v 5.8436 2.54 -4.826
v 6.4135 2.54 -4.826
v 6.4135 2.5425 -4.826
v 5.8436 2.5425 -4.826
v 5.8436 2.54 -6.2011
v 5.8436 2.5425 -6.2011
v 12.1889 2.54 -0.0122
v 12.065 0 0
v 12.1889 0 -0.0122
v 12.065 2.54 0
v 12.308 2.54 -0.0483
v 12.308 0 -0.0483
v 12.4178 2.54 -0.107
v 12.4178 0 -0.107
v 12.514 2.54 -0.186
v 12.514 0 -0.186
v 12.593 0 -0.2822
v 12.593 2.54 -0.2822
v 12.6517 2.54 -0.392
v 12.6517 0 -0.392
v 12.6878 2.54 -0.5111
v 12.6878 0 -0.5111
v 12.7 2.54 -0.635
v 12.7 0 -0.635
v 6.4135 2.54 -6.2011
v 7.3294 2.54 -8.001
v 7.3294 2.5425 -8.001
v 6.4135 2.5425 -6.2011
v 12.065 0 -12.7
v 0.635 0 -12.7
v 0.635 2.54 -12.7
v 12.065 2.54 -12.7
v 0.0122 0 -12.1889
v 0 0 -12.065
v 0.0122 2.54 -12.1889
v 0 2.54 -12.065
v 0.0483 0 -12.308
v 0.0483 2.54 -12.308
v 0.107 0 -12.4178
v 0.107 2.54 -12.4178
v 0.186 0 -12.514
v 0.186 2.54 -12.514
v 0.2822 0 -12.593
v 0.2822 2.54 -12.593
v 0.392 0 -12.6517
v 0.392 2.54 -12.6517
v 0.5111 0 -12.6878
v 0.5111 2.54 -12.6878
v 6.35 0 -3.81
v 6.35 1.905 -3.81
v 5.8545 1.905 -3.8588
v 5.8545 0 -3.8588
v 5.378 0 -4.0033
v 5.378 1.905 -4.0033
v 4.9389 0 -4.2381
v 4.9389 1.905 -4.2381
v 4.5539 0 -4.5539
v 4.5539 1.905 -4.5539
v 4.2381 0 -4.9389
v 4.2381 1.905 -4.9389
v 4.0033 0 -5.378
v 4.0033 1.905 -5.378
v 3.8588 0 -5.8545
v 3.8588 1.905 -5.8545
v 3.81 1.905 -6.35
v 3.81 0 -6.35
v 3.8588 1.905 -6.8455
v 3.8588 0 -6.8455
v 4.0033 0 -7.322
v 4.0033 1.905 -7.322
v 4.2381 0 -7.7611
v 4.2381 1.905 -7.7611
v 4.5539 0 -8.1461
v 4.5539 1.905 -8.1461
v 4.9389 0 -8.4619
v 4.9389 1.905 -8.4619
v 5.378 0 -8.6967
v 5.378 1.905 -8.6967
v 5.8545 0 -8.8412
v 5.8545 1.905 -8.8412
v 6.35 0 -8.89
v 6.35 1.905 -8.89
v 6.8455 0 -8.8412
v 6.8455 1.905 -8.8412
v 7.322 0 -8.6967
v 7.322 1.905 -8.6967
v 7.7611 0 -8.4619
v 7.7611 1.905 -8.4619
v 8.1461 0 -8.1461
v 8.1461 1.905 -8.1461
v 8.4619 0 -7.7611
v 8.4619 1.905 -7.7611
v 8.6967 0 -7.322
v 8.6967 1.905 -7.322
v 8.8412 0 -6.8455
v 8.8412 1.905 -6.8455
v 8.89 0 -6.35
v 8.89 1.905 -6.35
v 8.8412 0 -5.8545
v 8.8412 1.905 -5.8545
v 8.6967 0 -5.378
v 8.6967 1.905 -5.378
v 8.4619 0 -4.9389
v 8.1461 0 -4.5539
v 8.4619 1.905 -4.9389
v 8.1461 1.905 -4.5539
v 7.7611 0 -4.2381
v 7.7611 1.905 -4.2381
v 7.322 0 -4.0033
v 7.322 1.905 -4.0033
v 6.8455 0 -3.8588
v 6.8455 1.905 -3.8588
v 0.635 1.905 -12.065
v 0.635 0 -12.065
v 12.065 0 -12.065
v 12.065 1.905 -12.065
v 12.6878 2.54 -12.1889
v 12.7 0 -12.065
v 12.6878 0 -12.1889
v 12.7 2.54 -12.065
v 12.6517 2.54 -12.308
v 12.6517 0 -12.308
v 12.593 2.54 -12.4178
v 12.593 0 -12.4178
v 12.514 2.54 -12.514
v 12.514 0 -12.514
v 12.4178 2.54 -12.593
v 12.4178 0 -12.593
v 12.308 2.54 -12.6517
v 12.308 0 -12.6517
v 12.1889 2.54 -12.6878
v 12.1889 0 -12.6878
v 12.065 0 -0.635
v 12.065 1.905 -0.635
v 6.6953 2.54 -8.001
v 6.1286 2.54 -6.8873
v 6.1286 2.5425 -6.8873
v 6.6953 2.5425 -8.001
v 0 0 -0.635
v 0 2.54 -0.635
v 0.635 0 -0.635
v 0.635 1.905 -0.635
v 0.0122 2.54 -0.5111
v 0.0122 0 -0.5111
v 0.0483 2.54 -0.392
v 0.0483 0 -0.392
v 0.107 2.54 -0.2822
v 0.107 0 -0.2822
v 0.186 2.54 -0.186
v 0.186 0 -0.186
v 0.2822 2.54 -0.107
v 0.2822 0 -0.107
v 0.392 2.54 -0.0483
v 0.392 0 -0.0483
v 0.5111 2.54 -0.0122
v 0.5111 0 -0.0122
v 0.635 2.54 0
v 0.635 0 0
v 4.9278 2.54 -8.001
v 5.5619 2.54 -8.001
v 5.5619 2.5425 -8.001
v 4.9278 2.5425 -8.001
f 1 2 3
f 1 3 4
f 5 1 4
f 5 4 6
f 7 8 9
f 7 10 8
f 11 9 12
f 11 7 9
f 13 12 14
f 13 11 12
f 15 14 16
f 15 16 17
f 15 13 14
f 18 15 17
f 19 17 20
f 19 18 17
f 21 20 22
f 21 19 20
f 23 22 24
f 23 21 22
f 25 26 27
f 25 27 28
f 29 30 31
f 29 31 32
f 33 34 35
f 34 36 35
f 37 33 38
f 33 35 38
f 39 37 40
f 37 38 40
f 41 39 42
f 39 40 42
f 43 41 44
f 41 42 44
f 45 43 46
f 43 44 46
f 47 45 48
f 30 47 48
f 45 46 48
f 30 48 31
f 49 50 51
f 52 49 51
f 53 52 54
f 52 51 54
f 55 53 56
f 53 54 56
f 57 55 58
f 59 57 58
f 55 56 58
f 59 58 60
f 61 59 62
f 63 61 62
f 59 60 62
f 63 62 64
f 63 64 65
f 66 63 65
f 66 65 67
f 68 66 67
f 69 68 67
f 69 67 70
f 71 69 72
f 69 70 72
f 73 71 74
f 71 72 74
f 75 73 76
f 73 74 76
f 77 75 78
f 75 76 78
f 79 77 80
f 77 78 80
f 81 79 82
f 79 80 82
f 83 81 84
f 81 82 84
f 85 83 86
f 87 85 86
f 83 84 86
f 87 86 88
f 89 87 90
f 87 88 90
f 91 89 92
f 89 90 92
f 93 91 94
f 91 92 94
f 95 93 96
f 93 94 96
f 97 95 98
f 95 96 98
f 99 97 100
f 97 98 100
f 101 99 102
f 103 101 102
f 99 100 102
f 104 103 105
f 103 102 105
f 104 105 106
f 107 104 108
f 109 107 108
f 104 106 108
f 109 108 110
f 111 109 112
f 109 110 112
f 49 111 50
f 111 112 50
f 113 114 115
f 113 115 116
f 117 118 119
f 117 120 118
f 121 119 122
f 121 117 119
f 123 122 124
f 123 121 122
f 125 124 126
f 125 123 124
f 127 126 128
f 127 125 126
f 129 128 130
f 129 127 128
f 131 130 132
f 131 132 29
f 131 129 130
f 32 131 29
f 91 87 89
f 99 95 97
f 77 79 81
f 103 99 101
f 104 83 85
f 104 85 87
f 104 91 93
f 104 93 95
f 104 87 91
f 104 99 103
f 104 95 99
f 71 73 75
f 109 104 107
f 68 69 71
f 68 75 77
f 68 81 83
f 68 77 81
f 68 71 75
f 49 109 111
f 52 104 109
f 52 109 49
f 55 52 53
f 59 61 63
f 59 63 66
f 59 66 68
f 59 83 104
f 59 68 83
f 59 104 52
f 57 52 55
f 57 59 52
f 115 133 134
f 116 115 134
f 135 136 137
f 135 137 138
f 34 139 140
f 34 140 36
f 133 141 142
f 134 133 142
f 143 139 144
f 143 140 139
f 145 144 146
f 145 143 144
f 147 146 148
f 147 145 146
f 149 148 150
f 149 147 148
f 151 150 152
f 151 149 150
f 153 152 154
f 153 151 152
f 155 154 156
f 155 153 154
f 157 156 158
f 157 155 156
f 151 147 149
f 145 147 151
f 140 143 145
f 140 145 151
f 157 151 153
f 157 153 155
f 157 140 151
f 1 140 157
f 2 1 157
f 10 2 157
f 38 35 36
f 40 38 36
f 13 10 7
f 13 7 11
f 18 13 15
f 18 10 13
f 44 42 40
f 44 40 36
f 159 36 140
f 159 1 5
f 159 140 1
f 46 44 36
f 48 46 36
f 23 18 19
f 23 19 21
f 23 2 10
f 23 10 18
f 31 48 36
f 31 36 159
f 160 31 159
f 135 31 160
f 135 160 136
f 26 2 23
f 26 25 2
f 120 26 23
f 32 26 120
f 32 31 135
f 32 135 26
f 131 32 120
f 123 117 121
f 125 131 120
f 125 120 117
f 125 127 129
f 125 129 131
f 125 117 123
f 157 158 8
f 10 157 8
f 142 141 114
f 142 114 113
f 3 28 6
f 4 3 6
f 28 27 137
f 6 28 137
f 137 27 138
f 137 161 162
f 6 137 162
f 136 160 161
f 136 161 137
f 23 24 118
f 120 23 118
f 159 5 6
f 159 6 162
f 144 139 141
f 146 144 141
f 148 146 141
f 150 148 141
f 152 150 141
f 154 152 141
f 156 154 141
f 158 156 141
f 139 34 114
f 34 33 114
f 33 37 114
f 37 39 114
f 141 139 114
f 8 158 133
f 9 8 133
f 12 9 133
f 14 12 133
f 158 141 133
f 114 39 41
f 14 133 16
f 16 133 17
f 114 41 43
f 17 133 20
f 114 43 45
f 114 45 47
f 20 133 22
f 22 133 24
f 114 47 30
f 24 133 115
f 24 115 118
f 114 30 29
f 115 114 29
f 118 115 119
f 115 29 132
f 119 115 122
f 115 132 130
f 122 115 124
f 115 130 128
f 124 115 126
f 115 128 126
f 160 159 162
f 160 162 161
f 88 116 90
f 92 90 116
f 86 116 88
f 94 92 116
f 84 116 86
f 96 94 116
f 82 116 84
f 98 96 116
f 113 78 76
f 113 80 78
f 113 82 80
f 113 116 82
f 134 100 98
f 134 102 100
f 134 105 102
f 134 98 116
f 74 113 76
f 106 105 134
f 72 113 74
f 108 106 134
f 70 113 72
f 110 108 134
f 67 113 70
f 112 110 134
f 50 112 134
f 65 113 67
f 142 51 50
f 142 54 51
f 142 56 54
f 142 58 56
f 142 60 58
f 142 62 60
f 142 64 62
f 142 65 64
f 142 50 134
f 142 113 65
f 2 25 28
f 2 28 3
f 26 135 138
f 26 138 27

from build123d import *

# Parameters (mm, degrees)
SKETCH1_W           = 12.7
SKETCH1_H           = 12.7
BOSS_EXTRUDE1_DEPTH = 2.54
FILLET1_R           = 0.635
SHELL1_START        = 0.635
SHELL1_OUTLINE_W    = 1.905
SHELL1_OUTLINE_H    = 11.43
SHELL1_DEPTH        = 11.43
SKETCH2_R           = 2.54
BOSS_EXTRUDE2_DEPTH = 1.905
BOSS_EXTRUDE3_DEPTH = 0.00254


# Read off the part's stored shape, not the designer's step: Shell1
with BuildPart() as part:
    # Sketch1 → Boss-Extrude1 (new body)
    with BuildSketch(Plane(origin=(0, 0, 0), x_dir=(1, 0, 0), z_dir=(0, 1, 0))):
        with Locations((6.35, 6.35)):
            Rectangle(SKETCH1_W, SKETCH1_H)
    extrude(amount=BOSS_EXTRUDE1_DEPTH)

    # Fillet1
    fillet1_edges = [part.edges().sort_by_distance(p)[0] for p in [
        (0, 1.27, -12.7),
        (12.7, 1.27, -12.7),
        (12.7, 1.27, 0),
        (0, 1.27, 0),
    ]]
    fillet(fillet1_edges, radius=FILLET1_R)

    # Shell1 outline → Shell1 (cut)
    with BuildSketch(Plane.YZ.offset(SHELL1_START)):
        with Locations((0.9525, -6.35)):
            Rectangle(SHELL1_OUTLINE_W, SHELL1_OUTLINE_H)
    extrude(amount=SHELL1_DEPTH, mode=Mode.SUBTRACT)

    # Sketch2 → Boss-Extrude2 (add)
    with BuildSketch(Plane(origin=(0, 1.905, 0), x_dir=(-1, 0, 0), z_dir=(0, -1, 0))):
        with Locations(Location((-6.35, 6.35, 0), (0, 0, 270))):
            Circle(SKETCH2_R)
    extrude(amount=BOSS_EXTRUDE2_DEPTH)

    # Sketch3 → Boss-Extrude3 (add)
    with BuildSketch(Plane(origin=(0, 2.54, 0), x_dir=(1, 0, 0), z_dir=(0, 1, 0))):
        Polygon((4.927762821, 8.001), (5.561872396, 8.001), (6.128564103, 6.887333133), (6.695255809, 8.001), (7.329365385, 8.001), (6.4135, 6.201070112), (6.4135, 4.826), (5.843628205, 4.826), (5.843628205, 6.201070112), align=None)
    extrude(amount=BOSS_EXTRUDE3_DEPTH)


solid = part.part
